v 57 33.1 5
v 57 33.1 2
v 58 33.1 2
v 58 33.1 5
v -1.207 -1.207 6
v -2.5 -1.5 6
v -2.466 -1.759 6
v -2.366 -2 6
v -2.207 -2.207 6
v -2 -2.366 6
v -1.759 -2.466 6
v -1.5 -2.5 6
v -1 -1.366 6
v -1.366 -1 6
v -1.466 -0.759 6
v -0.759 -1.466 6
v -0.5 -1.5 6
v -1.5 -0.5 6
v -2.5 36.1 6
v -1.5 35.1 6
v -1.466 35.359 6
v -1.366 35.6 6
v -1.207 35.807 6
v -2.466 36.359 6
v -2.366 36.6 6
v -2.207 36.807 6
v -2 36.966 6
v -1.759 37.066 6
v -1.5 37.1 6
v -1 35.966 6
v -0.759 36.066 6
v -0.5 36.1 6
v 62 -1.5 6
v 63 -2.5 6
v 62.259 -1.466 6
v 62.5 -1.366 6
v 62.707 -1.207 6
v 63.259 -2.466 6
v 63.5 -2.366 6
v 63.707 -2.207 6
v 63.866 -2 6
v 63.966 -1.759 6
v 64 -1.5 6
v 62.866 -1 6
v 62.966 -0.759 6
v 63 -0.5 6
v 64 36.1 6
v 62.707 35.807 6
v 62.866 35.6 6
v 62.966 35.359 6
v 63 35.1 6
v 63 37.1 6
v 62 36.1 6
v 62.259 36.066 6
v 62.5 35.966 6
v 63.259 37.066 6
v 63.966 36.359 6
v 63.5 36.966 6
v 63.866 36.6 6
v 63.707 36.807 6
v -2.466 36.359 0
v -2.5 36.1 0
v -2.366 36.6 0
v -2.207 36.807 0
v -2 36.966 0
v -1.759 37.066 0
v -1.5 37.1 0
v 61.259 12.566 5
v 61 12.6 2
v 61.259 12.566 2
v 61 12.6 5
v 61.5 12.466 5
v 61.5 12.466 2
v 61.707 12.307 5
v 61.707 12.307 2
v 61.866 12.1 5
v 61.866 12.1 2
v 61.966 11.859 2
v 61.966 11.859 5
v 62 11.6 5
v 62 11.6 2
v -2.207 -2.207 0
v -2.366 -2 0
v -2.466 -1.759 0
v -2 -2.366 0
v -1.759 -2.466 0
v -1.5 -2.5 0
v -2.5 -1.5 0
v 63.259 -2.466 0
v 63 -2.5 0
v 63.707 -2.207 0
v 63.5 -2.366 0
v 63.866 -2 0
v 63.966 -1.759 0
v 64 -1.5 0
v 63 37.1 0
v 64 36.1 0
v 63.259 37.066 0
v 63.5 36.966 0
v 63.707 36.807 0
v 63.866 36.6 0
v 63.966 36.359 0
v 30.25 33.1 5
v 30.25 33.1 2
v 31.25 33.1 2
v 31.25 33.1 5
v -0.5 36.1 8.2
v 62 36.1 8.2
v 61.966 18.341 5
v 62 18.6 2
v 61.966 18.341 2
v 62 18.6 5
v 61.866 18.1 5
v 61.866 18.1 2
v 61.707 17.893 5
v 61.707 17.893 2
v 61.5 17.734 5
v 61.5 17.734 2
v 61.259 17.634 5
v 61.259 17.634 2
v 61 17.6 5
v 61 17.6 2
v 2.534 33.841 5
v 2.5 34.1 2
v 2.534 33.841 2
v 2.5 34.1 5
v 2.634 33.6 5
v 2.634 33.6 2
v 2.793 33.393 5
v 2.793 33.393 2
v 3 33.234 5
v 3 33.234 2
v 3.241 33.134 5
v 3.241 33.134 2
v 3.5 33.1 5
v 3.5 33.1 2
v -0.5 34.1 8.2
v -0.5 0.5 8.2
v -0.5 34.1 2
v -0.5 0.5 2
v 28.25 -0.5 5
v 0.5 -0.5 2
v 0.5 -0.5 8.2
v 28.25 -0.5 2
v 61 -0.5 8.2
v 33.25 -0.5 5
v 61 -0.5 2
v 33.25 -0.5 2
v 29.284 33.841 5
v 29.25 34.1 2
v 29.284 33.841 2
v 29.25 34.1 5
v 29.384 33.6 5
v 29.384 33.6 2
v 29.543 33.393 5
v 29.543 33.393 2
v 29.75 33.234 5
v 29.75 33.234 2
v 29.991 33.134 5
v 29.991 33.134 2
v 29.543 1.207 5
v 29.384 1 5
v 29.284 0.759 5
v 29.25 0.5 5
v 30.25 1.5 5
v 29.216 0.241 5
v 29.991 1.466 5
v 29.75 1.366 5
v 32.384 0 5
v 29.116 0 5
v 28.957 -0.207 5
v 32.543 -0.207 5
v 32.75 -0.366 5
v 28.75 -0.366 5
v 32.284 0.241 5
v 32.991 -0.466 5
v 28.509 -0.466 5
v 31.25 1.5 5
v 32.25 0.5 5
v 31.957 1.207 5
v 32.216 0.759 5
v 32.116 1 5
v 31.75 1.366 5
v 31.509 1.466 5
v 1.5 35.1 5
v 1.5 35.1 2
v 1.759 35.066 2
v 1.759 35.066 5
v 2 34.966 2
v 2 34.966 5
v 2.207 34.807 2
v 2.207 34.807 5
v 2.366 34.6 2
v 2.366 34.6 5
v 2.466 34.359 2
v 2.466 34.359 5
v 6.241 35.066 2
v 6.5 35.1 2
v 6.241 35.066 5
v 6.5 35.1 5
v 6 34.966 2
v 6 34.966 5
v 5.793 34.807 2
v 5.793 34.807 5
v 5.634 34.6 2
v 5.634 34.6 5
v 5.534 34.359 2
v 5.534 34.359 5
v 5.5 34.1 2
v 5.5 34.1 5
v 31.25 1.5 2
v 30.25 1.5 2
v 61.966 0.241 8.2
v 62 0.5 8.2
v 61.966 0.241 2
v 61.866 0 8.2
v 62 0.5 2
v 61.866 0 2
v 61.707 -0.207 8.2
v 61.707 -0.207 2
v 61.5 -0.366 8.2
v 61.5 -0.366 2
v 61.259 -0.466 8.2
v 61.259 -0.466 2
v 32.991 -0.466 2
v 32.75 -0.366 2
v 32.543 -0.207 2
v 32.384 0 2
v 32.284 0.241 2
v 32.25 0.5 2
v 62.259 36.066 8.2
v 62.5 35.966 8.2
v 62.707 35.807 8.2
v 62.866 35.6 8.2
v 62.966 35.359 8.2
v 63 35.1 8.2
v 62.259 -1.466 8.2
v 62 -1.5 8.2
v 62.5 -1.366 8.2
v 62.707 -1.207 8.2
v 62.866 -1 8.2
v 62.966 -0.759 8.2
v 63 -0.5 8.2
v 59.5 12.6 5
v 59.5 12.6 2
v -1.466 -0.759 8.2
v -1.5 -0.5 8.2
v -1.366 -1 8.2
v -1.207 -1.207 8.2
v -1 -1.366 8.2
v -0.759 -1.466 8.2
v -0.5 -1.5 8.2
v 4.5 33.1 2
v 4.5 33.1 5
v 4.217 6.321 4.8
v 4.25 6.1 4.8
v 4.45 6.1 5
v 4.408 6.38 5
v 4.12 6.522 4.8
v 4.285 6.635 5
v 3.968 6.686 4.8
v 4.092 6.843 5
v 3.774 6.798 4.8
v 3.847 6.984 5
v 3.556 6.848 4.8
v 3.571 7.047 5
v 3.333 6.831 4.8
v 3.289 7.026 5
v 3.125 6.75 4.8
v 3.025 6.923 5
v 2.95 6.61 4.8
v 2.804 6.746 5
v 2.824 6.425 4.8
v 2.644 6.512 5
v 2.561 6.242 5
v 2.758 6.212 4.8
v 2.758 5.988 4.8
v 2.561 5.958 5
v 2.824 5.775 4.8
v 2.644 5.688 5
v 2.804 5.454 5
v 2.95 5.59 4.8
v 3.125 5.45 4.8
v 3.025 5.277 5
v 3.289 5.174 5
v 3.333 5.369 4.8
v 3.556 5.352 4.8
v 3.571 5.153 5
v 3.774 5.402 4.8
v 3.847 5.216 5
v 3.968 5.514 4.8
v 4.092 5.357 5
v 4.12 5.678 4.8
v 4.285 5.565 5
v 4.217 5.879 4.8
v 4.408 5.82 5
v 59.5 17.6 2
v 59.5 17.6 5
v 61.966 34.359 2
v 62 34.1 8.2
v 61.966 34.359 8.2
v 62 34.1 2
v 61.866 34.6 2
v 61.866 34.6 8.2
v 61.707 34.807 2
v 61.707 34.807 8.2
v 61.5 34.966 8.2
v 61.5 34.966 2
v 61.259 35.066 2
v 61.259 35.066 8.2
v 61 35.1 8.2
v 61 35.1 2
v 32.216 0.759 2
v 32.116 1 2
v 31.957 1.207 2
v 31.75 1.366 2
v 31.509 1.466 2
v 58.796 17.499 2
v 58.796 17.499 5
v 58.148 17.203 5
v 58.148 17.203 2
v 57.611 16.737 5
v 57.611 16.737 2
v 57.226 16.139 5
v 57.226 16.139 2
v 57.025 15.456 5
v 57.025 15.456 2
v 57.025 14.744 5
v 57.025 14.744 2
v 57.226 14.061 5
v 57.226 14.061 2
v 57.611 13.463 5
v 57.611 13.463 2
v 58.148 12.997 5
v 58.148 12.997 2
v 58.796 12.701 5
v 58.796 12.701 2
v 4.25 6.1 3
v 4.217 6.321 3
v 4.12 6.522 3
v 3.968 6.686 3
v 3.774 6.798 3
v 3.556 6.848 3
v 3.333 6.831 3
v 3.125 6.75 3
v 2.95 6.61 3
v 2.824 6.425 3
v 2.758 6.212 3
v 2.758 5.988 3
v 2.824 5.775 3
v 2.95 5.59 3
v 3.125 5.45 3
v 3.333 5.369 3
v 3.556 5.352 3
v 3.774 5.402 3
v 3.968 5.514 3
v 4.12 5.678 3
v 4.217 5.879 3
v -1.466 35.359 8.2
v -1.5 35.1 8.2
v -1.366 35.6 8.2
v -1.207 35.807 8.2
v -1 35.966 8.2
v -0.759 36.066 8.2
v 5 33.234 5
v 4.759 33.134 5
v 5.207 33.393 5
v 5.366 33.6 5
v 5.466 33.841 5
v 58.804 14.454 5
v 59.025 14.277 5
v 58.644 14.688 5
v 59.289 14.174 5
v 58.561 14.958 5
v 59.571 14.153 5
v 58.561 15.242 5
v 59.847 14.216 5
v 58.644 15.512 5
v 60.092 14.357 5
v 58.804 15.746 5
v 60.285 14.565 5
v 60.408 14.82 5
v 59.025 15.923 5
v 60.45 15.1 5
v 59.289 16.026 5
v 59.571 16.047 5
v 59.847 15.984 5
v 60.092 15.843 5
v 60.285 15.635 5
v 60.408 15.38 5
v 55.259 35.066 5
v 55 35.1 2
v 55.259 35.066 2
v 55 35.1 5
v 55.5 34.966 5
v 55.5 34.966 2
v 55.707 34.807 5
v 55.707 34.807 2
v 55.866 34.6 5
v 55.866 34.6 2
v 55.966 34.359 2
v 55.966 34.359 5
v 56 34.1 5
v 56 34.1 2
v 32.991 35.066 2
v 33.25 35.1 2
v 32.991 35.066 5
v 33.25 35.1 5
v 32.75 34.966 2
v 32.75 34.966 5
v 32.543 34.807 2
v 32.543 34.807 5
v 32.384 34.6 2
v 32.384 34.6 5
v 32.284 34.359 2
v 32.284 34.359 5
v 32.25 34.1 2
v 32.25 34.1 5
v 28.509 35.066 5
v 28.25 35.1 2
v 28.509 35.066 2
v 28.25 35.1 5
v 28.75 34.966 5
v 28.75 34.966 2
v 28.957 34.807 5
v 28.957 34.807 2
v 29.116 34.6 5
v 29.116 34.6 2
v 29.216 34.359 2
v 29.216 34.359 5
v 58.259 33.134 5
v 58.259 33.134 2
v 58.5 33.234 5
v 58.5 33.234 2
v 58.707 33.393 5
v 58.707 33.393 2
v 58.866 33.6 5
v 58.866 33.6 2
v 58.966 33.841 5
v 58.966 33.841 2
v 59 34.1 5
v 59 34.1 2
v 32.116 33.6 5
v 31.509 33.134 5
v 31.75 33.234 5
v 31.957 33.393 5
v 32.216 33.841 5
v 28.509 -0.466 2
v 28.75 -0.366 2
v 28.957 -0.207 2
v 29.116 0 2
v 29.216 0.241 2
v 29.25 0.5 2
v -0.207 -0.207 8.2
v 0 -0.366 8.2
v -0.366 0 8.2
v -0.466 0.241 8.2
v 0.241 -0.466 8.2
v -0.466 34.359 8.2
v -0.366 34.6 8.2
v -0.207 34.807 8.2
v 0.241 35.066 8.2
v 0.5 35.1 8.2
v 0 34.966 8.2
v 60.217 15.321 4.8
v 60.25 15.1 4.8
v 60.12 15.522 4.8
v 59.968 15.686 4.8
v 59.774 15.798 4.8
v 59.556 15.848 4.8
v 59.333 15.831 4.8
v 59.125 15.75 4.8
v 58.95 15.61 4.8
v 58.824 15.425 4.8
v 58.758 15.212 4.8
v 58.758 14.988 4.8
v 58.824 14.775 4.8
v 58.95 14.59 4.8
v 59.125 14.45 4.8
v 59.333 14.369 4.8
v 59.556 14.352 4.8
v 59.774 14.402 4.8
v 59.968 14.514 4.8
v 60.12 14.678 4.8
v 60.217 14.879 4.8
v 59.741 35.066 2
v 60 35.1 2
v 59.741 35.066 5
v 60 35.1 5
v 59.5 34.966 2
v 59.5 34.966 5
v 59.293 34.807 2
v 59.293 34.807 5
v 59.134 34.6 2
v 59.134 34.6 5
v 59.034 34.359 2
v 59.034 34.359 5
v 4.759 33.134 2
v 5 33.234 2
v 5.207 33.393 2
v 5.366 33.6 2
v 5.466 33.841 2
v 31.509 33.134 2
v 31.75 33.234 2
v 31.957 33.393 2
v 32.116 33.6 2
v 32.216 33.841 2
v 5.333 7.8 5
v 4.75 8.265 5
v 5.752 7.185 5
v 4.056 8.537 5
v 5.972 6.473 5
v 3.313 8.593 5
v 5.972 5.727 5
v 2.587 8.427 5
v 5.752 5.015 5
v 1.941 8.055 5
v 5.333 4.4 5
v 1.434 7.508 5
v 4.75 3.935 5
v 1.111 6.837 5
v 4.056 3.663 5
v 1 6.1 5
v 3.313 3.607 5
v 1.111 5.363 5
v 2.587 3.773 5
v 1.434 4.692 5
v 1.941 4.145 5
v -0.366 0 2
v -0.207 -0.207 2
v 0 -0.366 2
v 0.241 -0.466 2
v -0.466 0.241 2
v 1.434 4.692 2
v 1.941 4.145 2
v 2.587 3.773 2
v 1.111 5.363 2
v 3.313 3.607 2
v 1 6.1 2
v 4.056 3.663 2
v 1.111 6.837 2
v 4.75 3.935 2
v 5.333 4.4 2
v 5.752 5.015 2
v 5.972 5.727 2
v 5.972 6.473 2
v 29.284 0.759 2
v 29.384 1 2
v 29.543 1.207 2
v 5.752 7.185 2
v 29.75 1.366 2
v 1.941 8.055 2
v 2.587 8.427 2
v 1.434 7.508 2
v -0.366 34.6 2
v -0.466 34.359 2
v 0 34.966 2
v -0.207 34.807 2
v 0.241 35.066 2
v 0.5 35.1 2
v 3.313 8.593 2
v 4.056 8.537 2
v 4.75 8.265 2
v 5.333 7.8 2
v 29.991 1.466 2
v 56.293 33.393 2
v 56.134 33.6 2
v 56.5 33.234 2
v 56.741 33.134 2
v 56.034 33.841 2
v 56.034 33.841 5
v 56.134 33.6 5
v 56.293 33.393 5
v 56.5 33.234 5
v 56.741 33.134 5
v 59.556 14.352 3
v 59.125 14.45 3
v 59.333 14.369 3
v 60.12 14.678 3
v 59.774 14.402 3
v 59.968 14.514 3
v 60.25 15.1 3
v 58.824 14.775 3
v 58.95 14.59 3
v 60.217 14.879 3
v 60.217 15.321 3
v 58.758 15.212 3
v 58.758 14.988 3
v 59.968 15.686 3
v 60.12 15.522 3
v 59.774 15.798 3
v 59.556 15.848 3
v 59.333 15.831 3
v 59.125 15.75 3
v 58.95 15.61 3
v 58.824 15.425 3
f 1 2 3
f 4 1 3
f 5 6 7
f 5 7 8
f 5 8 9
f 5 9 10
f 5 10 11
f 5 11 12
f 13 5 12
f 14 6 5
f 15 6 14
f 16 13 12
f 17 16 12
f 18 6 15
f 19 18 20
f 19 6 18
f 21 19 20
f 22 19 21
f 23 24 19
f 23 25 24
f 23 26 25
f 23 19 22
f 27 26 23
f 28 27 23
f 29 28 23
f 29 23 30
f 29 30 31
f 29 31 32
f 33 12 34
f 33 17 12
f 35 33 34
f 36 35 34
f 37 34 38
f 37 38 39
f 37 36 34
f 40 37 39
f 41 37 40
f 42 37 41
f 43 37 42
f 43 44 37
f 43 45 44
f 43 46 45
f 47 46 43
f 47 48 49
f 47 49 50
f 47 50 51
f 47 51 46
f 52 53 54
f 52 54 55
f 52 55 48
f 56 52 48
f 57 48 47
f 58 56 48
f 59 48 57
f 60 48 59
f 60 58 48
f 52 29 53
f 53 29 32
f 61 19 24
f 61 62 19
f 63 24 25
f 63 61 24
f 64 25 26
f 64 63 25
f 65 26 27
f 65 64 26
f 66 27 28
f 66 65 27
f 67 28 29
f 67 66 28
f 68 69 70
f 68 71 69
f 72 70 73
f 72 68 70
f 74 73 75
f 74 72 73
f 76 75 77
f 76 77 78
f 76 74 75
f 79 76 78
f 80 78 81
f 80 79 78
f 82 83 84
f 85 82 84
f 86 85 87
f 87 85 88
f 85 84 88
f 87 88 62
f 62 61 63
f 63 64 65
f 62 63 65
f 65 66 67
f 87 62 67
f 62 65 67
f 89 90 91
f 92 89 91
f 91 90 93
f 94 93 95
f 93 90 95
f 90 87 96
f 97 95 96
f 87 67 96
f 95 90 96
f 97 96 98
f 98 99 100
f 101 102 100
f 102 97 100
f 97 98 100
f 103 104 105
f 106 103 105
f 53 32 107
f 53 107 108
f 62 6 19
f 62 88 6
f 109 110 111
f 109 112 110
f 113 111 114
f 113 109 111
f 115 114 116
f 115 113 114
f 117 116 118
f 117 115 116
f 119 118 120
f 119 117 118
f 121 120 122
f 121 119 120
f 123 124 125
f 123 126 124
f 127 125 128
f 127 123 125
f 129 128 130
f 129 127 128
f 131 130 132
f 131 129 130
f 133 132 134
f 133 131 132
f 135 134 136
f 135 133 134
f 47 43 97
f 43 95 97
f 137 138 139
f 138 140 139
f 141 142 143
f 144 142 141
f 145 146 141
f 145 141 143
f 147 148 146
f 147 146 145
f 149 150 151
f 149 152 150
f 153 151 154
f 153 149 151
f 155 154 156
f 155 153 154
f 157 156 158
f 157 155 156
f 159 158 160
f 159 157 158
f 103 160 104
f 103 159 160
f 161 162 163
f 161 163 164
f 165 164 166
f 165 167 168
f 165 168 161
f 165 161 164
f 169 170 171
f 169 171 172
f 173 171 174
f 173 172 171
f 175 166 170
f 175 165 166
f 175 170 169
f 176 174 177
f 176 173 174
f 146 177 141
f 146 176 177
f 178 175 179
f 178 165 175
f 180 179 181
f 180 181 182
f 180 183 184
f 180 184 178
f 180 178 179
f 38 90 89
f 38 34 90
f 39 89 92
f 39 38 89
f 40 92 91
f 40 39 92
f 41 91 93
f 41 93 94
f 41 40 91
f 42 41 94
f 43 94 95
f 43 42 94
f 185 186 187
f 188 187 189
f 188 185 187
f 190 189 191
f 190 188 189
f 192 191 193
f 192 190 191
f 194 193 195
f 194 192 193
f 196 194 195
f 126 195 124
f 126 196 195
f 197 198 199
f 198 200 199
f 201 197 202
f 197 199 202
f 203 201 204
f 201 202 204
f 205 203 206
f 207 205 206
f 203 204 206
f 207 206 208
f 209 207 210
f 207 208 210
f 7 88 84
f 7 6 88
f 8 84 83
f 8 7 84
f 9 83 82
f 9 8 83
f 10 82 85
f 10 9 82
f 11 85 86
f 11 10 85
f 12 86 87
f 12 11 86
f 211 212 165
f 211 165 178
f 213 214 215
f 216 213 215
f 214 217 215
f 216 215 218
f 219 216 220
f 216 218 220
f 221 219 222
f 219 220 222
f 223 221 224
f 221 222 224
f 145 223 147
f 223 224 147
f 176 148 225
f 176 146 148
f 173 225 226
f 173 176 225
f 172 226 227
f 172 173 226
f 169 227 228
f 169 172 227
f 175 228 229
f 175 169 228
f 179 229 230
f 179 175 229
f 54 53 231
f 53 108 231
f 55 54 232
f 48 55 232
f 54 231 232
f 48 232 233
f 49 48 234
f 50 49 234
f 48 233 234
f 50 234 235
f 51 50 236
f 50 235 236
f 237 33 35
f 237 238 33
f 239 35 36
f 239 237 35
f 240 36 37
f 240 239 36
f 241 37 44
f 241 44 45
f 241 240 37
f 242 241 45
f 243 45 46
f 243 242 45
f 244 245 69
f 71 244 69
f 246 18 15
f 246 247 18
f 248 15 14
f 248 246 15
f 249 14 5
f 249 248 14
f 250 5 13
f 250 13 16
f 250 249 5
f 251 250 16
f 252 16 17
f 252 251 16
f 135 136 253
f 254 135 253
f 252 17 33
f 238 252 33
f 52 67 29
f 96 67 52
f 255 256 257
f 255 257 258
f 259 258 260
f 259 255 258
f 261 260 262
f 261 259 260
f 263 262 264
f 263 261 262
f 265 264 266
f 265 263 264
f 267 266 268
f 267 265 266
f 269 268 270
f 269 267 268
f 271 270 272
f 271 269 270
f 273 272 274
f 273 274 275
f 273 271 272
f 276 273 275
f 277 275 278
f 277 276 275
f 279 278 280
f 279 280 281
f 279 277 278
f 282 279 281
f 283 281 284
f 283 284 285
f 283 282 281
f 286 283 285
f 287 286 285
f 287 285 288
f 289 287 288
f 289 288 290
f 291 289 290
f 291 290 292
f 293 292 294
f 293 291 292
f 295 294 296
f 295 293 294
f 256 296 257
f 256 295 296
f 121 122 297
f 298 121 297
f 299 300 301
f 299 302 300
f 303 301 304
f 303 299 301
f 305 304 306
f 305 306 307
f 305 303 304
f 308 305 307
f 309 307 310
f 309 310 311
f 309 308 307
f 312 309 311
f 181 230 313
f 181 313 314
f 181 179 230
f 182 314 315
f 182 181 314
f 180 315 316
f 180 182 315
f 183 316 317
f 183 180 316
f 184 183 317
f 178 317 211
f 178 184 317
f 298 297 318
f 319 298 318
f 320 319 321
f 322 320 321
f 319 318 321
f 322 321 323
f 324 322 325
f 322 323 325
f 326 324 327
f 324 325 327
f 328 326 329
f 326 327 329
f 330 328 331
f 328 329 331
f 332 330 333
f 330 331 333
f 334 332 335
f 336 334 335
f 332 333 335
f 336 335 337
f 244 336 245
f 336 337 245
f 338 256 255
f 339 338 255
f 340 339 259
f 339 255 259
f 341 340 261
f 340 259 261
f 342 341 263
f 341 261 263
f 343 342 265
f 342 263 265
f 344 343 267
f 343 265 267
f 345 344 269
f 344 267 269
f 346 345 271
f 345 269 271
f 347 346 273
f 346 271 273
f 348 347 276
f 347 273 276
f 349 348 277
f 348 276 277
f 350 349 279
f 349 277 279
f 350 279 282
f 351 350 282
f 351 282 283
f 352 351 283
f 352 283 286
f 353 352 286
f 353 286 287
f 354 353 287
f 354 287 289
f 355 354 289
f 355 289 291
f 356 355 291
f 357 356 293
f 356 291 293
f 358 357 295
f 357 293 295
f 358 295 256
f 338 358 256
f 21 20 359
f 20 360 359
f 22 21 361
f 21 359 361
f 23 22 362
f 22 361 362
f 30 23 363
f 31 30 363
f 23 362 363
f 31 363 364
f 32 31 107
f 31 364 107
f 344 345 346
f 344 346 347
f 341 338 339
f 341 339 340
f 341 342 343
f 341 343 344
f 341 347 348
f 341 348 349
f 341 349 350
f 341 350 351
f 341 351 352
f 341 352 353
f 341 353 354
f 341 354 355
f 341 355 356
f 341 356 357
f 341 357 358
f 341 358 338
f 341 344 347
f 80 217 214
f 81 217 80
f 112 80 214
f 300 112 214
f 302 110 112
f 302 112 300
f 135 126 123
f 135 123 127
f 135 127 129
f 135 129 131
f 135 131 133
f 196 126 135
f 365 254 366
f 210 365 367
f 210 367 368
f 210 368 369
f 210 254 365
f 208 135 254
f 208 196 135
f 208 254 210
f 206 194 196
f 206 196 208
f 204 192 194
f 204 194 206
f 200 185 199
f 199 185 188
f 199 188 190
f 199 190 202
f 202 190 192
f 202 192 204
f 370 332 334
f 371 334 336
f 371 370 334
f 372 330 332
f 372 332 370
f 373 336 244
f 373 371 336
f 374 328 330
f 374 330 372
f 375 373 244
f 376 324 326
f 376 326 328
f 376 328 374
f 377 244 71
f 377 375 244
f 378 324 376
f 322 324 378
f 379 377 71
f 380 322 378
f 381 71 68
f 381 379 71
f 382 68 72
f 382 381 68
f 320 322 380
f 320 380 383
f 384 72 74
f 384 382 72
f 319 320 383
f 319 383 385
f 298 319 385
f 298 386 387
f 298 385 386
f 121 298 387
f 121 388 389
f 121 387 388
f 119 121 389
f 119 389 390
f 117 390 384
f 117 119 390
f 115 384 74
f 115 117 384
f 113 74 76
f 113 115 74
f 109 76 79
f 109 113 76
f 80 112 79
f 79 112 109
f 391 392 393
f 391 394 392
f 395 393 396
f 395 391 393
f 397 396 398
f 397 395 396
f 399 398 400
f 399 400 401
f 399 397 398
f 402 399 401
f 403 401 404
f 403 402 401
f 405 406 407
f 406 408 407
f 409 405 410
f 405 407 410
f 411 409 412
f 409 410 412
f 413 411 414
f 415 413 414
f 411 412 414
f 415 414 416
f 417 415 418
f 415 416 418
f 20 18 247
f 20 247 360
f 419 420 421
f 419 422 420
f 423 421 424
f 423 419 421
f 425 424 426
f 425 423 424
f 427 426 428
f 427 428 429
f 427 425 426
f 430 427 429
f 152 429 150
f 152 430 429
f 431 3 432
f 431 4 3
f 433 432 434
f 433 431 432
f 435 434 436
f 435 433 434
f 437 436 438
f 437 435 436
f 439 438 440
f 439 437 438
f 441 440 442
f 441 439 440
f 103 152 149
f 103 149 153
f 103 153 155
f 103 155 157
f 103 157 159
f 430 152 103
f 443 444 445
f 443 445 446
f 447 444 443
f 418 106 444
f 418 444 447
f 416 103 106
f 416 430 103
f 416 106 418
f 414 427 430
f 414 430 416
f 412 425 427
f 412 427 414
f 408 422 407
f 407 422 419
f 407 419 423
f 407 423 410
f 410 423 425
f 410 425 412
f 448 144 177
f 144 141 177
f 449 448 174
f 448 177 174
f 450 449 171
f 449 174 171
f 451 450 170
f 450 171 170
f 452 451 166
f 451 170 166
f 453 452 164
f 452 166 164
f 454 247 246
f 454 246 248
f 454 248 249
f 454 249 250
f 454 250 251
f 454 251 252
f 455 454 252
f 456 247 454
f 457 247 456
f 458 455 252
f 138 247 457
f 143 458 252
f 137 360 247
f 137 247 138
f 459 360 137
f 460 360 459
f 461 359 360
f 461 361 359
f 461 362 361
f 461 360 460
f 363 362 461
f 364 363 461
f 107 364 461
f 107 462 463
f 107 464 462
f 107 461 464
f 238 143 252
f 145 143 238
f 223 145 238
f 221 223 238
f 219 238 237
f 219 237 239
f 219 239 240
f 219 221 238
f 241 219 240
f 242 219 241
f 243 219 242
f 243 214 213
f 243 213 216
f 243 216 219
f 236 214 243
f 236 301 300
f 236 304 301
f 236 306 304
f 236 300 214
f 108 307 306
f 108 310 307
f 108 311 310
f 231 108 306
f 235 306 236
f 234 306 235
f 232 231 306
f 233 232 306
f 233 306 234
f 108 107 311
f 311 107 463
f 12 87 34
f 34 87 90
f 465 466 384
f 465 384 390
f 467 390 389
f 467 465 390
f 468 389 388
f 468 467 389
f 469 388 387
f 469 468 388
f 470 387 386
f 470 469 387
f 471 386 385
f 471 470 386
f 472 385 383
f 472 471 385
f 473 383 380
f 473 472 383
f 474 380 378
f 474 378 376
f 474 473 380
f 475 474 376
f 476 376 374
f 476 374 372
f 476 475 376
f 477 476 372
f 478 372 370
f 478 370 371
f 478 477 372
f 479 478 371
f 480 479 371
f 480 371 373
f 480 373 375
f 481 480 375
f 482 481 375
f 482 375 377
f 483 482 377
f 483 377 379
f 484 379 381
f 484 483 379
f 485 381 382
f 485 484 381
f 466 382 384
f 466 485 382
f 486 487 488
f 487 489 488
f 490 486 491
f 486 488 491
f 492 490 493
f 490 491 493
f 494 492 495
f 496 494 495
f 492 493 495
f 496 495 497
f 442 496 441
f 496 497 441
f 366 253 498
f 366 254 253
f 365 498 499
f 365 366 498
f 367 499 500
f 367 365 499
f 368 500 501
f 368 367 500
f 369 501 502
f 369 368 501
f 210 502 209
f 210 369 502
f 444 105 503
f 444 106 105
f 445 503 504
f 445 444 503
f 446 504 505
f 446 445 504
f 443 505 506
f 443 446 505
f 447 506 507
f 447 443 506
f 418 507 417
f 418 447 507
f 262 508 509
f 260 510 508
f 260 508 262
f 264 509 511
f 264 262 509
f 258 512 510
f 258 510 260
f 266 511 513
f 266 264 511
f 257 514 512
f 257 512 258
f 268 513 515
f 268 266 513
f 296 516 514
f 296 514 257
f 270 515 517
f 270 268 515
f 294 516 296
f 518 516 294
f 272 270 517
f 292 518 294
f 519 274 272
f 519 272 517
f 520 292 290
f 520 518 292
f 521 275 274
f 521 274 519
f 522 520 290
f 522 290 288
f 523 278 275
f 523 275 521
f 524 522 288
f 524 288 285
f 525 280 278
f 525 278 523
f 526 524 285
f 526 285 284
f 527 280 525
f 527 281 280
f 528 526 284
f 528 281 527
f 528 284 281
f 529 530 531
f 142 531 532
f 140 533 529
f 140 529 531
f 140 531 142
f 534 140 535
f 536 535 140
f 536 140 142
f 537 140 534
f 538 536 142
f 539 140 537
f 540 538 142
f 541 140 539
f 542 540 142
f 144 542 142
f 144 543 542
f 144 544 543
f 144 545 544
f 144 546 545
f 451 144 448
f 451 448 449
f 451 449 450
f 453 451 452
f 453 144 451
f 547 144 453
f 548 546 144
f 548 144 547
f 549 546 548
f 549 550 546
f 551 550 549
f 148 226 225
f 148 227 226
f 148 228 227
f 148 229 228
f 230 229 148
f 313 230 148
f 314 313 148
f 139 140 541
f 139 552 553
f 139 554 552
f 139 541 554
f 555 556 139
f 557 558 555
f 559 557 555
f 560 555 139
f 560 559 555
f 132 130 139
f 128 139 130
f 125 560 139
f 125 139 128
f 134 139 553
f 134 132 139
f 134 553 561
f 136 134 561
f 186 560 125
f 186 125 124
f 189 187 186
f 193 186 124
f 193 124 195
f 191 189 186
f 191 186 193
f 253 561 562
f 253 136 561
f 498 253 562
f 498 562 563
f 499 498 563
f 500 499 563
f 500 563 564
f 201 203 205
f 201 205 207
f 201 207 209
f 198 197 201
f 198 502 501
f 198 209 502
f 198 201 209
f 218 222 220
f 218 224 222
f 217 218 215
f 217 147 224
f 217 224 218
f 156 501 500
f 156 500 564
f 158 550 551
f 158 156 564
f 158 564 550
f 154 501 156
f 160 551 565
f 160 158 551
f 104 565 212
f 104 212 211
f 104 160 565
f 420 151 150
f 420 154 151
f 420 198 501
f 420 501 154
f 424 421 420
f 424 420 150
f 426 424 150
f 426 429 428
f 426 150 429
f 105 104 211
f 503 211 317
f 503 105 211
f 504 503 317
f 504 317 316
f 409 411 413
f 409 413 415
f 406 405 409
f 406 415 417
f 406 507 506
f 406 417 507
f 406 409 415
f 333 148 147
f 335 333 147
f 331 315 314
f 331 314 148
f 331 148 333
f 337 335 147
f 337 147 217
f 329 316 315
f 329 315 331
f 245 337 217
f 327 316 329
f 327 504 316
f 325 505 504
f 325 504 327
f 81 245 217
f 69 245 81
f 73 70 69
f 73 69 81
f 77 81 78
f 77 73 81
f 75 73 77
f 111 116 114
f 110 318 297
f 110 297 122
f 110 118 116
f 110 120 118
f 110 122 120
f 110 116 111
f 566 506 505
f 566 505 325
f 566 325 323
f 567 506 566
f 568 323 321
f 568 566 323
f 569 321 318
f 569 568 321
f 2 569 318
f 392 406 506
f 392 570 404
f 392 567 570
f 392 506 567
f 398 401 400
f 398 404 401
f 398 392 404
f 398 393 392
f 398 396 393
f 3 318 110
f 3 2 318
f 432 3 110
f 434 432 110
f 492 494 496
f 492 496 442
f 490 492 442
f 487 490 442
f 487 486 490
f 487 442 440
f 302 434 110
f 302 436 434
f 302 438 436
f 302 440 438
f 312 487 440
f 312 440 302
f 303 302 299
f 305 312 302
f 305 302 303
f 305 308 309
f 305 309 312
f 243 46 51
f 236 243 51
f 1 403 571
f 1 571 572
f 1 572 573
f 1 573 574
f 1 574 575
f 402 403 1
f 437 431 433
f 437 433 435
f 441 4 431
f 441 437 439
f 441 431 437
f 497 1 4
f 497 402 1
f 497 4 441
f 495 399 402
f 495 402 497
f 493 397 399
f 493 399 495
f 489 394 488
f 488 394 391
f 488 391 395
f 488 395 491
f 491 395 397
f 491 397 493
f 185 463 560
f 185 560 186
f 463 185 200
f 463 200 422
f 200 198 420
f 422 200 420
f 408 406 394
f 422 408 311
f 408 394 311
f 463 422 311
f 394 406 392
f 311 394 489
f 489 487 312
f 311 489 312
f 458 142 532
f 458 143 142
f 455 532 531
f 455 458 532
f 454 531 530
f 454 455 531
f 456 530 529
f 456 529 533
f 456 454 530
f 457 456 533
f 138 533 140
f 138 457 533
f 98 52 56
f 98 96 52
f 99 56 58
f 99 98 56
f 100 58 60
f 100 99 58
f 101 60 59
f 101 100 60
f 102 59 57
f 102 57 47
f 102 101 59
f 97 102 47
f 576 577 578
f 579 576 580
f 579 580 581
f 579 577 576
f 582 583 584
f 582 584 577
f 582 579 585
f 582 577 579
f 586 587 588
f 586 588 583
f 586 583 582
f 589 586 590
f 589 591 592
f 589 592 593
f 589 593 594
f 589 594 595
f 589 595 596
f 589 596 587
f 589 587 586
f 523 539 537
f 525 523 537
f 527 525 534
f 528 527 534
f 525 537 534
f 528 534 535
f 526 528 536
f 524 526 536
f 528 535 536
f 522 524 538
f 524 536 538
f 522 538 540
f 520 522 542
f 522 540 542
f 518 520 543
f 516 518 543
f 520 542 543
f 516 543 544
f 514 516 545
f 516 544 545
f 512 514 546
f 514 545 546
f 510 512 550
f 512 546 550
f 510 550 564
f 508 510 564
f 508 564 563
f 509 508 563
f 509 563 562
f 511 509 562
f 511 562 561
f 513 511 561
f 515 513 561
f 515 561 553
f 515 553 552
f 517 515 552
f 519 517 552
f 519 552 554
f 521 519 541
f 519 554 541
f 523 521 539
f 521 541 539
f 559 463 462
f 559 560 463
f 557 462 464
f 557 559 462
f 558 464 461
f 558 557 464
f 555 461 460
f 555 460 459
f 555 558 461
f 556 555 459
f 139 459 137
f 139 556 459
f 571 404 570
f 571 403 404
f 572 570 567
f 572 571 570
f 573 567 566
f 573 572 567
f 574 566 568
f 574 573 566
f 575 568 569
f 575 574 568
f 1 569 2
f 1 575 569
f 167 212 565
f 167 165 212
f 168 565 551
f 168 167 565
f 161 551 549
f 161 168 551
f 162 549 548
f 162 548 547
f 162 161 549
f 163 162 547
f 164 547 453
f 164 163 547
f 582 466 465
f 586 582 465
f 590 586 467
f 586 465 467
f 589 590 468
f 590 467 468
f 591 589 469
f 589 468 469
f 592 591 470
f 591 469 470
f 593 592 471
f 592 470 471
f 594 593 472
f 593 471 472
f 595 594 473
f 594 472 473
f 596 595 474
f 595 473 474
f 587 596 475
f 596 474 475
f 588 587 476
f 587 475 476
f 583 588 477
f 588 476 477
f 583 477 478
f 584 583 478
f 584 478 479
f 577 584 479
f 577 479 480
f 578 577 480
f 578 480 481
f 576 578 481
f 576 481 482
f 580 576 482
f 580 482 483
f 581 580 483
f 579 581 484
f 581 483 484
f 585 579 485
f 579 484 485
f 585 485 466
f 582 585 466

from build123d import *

# Parameters (mm, degrees)
SKETCH4_W            = 66.5
SKETCH4_H            = 39.6
BOSS_EXTRUDE4_DEPTH  = 2
SKETCH5_W            = 66.5
SKETCH5_H            = 39.6
SKETCH5_W_2          = 62.5
SKETCH5_H_2          = 35.6
BOSS_EXTRUDE5_DEPTH  = 4
SKETCH6_R            = 2.5
BOSS_EXTRUDE8_DEPTH  = 3
SKETCH7_R            = 0.75
CUT_EXTRUDE1_DEPTH   = 2
SKETCH9_W            = 64.5
SKETCH9_H            = 37.6
SKETCH9_W_2          = 62.5
SKETCH9_H_2          = 35.6
BOSS_EXTRUDE9_DEPTH  = 2.2
CHAMFER1_SIZE        = 0.2
CHAMFER2_SIZE        = 0.2
SKETCH11_W           = 3
SKETCH11_H           = 2
BOSS_EXTRUDE10_DEPTH = 3
FILLET1_R            = 1


with BuildPart() as part:
    # Sketch4 → Boss-Extrude4 (new body)
    with BuildSketch(Plane.XY):
        with Locations((30.75, 17.3)):
            Rectangle(SKETCH4_W, SKETCH4_H)
    extrude(amount=BOSS_EXTRUDE4_DEPTH)

    # Sketch5 → Boss-Extrude5 (add)
    with BuildSketch(Plane.XY.offset(2)):
        with Locations((30.75, 17.3)):
            Rectangle(SKETCH5_W, SKETCH5_H)
        with Locations((30.75, 17.3)):
            Rectangle(SKETCH5_W_2, SKETCH5_H_2, mode=Mode.SUBTRACT)
    extrude(amount=BOSS_EXTRUDE5_DEPTH)

    # Sketch6 → Boss-Extrude8 (add)
    with BuildSketch(Plane.XY.offset(2)):
        with Locations(Location((3.5, 6.1, 0), (0, 0, 180))):
            Circle(SKETCH6_R)
        with BuildLine():
            Line((59.5, 12.6), (62, 12.6))
            Line((62, 12.6), (62, 17.6))
            Line((62, 17.6), (59.5, 17.6))
            ThreePointArc((59.5, 17.6), (57, 15.1), (59.5, 12.6))
        make_face()
    extrude(amount=BOSS_EXTRUDE8_DEPTH)

    # Sketch7 → Cut-Extrude1 (cut)
    with BuildSketch(Plane.XY.offset(5)):
        with Locations((59.5, 15.1)):
            Circle(SKETCH7_R)
        with Locations((3.5, 6.1)):
            Circle(SKETCH7_R)
    extrude(amount=-CUT_EXTRUDE1_DEPTH, mode=Mode.SUBTRACT)

    # Sketch9 → Boss-Extrude9 (add)
    with BuildSketch(Plane.XY.offset(6)):
        with Locations((30.75, 17.3)):
            Rectangle(SKETCH9_W, SKETCH9_H)
        with Locations((30.75, 17.3)):
            Rectangle(SKETCH9_W_2, SKETCH9_H_2, mode=Mode.SUBTRACT)
    extrude(amount=BOSS_EXTRUDE9_DEPTH)

    # Chamfer1
    chamfer1_edges = [part.edges().sort_by_distance(p)[0] for p in [
        (2.75, 6.1, 5),
    ]]
    chamfer(chamfer1_edges, length=CHAMFER1_SIZE)

    # Chamfer2
    chamfer2_edges = [part.edges().sort_by_distance(p)[0] for p in [
        (58.75, 15.1, 5),
    ]]
    chamfer(chamfer2_edges, length=CHAMFER2_SIZE)

    # Sketch11 → Boss-Extrude10 (add)
    with BuildSketch(Plane.XY.offset(2)):
        with Locations((4, 34.1)):
            Rectangle(SKETCH11_W, SKETCH11_H)
        with Locations((30.75, 34.1)):
            Rectangle(SKETCH11_W, SKETCH11_H)
        with Locations((57.5, 34.1)):
            Rectangle(SKETCH11_W, SKETCH11_H)
        with Locations((30.75, 0.5)):
            Rectangle(SKETCH11_W, SKETCH11_H)
    extrude(amount=BOSS_EXTRUDE10_DEPTH)

    # Fillet1
    fillet1_edges = [part.edges().sort_by_distance(p)[0] for p in [
        (-1.5, 36.1, 7.1),
        (-2.5, 37.1, 3),
        (-1.5, -1.5, 7.1),
        (-2.5, -2.5, 3),
        (63, 36.1, 7.1),
        (63, -1.5, 7.1),
        (64, -2.5, 3),
        (64, 37.1, 3),
        (-0.5, -0.5, 5.1),
        (-0.5, 35.1, 5.1),
        (62, -0.5, 5.1),
        (62, 35.1, 5.1),
        (62, 12.6, 3.5),
        (62, 17.6, 3.5),
        (32.25, -0.5, 3.5),
        (29.25, -0.5, 3.5),
        (56, 35.1, 3.5),
        (59, 35.1, 3.5),
        (32.25, 35.1, 3.5),
        (29.25, 35.1, 3.5),
        (5.5, 35.1, 3.5),
        (2.5, 35.1, 3.5),
        (29.25, 1.5, 3.5),
        (32.25, 1.5, 3.5),
        (59, 33.1, 3.5),
        (56, 33.1, 3.5),
        (32.25, 33.1, 3.5),
        (29.25, 33.1, 3.5),
        (5.5, 33.1, 3.5),
        (2.5, 33.1, 3.5),
    ]]
    fillet(fillet1_edges, radius=FILLET1_R - 0.0001)  # a hair under: the kernel refuses the full size


solid = part.part
